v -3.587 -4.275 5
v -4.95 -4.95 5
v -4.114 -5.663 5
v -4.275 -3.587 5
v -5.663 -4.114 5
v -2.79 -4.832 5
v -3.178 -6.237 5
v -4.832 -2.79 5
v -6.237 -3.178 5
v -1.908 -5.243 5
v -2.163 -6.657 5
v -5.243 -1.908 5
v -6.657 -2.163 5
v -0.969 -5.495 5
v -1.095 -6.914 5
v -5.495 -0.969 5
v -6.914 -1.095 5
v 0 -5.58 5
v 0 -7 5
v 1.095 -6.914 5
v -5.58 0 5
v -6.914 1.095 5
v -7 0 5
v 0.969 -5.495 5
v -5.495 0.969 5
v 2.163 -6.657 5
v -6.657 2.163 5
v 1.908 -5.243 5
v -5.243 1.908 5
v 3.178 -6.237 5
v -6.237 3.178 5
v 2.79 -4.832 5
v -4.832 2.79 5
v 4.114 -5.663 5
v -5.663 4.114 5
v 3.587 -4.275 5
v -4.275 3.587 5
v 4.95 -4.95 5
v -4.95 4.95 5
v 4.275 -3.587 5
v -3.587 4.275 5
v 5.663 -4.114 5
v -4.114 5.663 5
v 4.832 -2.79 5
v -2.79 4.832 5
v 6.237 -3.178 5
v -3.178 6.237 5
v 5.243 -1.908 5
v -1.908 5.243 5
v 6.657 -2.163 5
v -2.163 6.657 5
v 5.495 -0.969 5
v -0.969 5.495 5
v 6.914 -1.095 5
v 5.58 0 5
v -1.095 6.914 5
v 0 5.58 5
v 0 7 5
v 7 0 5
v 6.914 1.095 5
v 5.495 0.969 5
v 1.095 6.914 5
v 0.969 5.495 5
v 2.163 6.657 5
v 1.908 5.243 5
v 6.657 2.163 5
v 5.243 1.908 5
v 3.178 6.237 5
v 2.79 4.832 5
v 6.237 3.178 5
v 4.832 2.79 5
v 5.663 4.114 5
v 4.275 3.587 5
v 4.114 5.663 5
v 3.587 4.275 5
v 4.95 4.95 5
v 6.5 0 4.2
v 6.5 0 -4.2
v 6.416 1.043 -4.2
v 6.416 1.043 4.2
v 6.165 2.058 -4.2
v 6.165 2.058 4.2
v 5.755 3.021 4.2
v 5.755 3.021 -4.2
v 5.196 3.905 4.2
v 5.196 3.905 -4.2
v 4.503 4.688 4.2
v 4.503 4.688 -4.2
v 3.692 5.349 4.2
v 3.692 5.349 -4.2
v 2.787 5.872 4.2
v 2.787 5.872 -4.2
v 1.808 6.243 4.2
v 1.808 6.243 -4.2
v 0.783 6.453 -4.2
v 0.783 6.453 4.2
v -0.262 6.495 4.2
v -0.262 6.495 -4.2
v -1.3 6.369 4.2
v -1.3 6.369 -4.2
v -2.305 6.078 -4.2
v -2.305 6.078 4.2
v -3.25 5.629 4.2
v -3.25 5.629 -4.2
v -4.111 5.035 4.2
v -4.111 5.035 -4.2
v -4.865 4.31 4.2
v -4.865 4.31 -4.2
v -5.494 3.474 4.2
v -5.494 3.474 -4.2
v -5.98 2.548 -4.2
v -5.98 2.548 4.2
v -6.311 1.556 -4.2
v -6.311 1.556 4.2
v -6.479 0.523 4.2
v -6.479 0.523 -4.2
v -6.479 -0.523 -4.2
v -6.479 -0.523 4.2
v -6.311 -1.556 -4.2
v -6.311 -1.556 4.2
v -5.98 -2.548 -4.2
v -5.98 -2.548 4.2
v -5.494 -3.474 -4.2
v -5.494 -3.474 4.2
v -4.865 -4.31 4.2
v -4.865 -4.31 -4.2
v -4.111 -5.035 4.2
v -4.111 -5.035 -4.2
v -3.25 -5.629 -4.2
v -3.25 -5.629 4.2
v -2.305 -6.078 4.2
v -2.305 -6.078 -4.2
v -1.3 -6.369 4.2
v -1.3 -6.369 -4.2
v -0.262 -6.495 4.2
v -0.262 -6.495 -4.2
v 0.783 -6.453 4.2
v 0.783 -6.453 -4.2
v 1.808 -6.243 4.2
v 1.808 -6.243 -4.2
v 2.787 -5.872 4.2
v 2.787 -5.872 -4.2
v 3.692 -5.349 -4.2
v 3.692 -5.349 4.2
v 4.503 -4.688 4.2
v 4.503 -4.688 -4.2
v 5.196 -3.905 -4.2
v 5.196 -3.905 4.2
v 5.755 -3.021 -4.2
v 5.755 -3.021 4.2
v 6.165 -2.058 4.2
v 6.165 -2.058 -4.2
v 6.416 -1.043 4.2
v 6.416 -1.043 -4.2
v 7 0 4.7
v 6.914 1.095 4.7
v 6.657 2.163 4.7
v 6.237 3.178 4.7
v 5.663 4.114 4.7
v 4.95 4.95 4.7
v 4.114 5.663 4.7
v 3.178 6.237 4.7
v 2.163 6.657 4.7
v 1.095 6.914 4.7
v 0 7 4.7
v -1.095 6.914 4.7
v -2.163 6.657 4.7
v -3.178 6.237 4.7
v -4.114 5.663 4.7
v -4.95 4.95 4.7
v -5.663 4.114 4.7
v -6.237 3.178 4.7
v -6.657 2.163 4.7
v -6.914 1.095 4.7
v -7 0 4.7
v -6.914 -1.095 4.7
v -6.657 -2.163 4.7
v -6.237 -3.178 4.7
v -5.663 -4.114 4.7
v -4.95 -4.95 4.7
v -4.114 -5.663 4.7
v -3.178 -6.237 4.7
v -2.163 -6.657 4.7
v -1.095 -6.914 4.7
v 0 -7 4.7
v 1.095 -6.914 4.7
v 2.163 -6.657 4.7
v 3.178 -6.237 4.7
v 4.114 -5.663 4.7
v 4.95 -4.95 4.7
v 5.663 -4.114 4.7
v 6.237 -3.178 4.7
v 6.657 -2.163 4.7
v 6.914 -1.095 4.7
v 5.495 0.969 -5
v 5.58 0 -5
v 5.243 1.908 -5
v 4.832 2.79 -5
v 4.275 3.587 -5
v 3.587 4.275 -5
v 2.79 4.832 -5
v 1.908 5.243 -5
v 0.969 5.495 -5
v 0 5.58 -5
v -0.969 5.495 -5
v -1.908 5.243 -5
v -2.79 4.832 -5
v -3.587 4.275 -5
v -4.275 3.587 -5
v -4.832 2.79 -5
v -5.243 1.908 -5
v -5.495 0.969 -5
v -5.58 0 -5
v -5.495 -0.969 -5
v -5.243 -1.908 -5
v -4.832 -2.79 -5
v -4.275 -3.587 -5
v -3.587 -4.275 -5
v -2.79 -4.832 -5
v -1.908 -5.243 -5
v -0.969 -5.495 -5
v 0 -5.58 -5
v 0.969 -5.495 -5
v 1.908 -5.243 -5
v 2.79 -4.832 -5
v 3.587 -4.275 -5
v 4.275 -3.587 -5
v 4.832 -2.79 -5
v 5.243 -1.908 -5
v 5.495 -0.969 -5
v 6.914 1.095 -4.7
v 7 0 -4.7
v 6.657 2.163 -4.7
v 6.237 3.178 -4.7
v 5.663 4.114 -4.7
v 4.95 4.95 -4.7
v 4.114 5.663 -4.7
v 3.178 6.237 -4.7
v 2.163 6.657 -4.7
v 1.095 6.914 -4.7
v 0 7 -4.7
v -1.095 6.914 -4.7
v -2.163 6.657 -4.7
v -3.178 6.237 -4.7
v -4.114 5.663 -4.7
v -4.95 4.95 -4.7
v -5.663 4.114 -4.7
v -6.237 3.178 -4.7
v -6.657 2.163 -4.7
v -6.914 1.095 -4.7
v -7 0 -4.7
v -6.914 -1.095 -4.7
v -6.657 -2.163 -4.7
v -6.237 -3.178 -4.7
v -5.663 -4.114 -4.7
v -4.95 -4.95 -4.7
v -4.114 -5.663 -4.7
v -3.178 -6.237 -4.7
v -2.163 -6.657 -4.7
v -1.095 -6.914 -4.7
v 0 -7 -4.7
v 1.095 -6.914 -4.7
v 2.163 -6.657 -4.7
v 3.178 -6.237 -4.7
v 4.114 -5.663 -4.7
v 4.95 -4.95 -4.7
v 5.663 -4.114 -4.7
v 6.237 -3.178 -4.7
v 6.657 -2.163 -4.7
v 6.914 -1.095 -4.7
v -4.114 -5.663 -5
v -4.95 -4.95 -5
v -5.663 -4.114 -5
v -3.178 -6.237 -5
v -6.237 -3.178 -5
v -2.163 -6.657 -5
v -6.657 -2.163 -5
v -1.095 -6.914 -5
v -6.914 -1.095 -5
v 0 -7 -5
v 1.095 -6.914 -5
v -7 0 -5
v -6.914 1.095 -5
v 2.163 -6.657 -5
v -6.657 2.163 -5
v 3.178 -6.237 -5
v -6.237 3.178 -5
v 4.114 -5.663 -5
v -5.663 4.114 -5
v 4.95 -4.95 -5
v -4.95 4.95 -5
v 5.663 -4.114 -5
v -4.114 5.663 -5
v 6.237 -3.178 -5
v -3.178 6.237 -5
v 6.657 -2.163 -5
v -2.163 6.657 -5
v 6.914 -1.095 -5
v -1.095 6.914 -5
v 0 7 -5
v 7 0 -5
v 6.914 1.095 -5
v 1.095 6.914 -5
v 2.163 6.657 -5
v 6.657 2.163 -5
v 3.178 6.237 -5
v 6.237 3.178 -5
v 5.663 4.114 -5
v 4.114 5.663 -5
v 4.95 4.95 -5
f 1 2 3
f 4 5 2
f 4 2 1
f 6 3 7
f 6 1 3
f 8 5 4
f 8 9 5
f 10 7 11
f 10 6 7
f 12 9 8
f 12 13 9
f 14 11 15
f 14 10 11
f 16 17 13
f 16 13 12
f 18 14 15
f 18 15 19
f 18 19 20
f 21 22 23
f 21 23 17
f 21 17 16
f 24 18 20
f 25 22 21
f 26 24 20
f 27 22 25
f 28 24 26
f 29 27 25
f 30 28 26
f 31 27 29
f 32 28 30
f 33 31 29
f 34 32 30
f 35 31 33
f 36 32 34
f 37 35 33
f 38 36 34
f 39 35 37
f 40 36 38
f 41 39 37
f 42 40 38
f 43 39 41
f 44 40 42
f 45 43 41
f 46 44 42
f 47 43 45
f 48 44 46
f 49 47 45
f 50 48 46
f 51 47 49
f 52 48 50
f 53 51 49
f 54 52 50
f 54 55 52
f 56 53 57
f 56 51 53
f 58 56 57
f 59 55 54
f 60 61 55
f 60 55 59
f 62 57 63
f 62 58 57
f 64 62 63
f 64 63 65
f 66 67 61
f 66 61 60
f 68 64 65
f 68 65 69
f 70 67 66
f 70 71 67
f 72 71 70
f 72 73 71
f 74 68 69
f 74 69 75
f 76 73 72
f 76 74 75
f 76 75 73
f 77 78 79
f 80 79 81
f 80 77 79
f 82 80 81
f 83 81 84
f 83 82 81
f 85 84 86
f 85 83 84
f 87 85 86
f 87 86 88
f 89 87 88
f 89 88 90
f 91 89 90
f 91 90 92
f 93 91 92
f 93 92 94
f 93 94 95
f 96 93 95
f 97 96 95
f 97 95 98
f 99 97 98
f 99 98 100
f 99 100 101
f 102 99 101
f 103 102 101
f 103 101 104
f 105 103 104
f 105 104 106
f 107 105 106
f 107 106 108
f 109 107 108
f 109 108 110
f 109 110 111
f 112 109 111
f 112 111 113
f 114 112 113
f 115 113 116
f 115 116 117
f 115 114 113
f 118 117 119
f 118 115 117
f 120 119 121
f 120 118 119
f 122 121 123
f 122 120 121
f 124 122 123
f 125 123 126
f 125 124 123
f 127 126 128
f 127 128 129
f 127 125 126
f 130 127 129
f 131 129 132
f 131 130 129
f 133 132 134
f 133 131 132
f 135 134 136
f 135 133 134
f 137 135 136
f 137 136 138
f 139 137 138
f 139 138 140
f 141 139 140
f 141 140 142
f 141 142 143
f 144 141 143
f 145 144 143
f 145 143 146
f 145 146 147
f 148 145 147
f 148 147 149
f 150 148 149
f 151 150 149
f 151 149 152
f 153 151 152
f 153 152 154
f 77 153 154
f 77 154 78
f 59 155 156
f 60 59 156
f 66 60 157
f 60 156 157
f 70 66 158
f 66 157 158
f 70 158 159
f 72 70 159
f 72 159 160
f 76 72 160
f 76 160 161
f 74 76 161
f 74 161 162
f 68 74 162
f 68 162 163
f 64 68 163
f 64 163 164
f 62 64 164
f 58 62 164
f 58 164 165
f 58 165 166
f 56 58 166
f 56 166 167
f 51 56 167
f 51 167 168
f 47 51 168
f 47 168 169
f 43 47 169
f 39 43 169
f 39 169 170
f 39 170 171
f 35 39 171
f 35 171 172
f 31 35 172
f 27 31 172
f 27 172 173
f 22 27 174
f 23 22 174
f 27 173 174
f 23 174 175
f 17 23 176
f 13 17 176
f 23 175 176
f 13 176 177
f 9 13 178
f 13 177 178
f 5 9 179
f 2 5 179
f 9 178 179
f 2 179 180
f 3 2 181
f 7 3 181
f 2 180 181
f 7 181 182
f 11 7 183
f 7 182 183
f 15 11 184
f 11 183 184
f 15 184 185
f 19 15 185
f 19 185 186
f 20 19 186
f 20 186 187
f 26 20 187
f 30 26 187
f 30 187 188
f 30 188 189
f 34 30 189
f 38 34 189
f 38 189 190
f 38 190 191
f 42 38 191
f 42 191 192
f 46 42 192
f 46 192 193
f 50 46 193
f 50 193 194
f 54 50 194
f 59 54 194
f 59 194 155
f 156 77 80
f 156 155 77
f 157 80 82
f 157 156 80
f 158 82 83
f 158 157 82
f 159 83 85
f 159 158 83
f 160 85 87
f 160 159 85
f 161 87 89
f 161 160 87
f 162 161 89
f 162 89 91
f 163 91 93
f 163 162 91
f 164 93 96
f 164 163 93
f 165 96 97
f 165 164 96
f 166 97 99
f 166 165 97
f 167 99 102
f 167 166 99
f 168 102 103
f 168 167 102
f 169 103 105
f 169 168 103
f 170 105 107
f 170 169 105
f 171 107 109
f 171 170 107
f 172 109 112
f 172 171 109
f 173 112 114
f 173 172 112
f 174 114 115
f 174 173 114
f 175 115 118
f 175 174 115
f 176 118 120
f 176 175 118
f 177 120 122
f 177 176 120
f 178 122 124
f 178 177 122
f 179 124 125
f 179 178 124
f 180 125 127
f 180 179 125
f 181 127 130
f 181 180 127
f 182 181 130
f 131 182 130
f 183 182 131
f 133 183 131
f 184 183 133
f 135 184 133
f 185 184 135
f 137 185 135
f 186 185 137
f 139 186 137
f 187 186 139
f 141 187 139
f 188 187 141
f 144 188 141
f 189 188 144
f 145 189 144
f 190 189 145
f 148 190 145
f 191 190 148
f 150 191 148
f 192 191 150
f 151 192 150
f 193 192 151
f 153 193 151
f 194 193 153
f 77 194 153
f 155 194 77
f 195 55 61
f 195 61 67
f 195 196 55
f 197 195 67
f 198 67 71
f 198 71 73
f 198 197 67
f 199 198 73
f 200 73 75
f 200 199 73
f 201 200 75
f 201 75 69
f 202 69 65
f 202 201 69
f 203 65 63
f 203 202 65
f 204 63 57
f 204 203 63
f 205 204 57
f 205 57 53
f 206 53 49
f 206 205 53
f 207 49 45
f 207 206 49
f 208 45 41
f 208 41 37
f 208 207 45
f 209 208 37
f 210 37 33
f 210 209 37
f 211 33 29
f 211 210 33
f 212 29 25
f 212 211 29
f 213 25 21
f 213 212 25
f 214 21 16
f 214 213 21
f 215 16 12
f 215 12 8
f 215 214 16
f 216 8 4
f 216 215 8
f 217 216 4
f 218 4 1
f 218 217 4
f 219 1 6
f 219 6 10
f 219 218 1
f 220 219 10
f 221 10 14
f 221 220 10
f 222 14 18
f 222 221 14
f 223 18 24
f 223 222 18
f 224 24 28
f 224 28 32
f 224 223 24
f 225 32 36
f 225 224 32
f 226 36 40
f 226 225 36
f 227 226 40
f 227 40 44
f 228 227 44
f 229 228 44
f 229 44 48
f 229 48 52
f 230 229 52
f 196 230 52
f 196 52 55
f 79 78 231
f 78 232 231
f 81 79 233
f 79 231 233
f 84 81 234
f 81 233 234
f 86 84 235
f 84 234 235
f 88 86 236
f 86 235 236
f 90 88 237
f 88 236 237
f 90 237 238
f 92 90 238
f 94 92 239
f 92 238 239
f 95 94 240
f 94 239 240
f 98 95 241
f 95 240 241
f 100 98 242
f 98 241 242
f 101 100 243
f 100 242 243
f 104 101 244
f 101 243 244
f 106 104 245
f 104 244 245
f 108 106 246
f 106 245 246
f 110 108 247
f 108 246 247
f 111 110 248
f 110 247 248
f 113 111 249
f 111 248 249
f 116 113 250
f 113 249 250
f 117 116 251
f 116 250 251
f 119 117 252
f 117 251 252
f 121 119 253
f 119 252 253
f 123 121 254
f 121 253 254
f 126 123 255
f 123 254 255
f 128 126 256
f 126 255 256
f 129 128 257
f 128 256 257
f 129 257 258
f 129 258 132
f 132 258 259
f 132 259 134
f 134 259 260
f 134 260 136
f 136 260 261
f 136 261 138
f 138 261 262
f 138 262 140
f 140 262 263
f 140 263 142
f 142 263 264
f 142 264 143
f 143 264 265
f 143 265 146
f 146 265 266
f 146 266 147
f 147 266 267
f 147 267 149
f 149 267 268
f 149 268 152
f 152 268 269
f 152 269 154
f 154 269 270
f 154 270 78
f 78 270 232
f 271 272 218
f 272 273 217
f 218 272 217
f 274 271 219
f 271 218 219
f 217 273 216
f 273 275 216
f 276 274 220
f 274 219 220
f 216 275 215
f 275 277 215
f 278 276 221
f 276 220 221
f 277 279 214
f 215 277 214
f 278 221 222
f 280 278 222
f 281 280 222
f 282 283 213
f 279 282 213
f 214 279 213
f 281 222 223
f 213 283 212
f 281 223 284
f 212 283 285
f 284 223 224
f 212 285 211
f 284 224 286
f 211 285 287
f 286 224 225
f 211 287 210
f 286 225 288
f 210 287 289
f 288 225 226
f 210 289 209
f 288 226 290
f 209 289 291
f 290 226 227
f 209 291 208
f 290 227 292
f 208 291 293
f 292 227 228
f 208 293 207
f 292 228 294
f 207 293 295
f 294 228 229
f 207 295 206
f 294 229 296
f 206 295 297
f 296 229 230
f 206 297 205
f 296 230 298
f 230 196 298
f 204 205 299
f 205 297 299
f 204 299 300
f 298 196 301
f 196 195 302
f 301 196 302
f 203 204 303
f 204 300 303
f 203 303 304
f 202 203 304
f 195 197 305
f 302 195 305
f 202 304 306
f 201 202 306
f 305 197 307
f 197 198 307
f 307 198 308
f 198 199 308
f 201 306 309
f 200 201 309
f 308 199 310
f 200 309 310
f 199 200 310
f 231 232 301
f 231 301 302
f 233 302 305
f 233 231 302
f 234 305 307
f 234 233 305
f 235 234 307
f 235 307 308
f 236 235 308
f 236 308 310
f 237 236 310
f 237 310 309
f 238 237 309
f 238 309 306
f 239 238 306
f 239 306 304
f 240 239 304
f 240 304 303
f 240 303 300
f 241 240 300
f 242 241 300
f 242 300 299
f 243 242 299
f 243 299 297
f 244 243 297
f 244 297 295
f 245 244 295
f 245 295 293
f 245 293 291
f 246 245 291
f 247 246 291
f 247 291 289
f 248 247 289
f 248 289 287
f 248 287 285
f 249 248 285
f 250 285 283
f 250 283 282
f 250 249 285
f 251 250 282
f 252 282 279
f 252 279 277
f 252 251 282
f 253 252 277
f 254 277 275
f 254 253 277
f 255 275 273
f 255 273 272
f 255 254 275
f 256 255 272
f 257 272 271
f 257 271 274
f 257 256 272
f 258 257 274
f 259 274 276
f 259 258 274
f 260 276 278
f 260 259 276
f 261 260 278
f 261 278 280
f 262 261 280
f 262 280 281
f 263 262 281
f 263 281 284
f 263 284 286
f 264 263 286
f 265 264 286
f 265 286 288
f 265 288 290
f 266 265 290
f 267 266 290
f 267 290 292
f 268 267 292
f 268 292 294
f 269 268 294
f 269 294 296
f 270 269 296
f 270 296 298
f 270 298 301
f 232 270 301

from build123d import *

# Parameters (mm, degrees)
SKETCH1_R           = 6.5
SKETCH1_R_2         = 5.58
BOSS_EXTRUDE1_DEPTH = 5
BOSS_EXTRUDE2_START = 1
SKETCH2_R           = 7
SKETCH2_R_2         = 6.5
BOSS_EXTRUDE2_DEPTH = 1
CHAMFER1_SIZE       = 0.7


with BuildPart() as part:
    # Sketch1 → Boss-Extrude1 (new, symmetric)
    with BuildSketch(Plane.XY):
        Circle(SKETCH1_R)
        Circle(SKETCH1_R_2, mode=Mode.SUBTRACT)
    extrude(amount=BOSS_EXTRUDE1_DEPTH, both=True)

    # Sketch2 → Boss-Extrude2 (add)
    with BuildSketch(Plane.XY.offset(-5).offset(BOSS_EXTRUDE2_START)):
        Circle(SKETCH2_R)
        Circle(SKETCH2_R_2, mode=Mode.SUBTRACT)
    boss_extrude2 = extrude(amount=-BOSS_EXTRUDE2_DEPTH)

    # Mirror1: Boss-Extrude2 across plane
    add(boss_extrude2.mirror(Plane.XY))

    # Chamfer1
    # the kernel refuses this chamfer: 0.7 mm, written as the material it takes off along each edge
    with BuildSketch(Plane(origin=(0, 0, 4), x_dir=(1, 0, 0), z_dir=(0, -1, 0))) as chamfer1_piece_1_section:
        Polygon((7 - CHAMFER1_SIZE, 0), (7, CHAMFER1_SIZE), (7, 0), align=None)
    chamfer1_piece_1 = revolve(axis=Axis((0, 0, 4), (0, 0, 1)), mode=Mode.PRIVATE)
    chamfer1_piece_1 = chamfer1_piece_1 - Plane(origin=(0, 0, 4.444446297), x_dir=(1, 0, 0), z_dir=(0, 0, 1)) * Cylinder(6.5, 29, mode=Mode.PRIVATE)
    add(chamfer1_piece_1, mode=Mode.SUBTRACT)
    with BuildSketch(Plane(origin=(0, 0, -4), x_dir=(1, 0, 0), z_dir=(0, -1, 0))) as chamfer1_piece_2_section:
        Polygon((7 - CHAMFER1_SIZE, 0), (7, -CHAMFER1_SIZE), (7, 0), align=None)
    chamfer1_piece_2 = revolve(axis=Axis((0, 0, -4), (0, 0, 1)), mode=Mode.PRIVATE)
    chamfer1_piece_2 = chamfer1_piece_2 - Plane(origin=(0, 0, -4.444446297), x_dir=(1, 0, 0), z_dir=(0, 0, 1)) * Cylinder(6.5, 29, mode=Mode.PRIVATE)
    add(chamfer1_piece_2, mode=Mode.SUBTRACT)


solid = part.part
